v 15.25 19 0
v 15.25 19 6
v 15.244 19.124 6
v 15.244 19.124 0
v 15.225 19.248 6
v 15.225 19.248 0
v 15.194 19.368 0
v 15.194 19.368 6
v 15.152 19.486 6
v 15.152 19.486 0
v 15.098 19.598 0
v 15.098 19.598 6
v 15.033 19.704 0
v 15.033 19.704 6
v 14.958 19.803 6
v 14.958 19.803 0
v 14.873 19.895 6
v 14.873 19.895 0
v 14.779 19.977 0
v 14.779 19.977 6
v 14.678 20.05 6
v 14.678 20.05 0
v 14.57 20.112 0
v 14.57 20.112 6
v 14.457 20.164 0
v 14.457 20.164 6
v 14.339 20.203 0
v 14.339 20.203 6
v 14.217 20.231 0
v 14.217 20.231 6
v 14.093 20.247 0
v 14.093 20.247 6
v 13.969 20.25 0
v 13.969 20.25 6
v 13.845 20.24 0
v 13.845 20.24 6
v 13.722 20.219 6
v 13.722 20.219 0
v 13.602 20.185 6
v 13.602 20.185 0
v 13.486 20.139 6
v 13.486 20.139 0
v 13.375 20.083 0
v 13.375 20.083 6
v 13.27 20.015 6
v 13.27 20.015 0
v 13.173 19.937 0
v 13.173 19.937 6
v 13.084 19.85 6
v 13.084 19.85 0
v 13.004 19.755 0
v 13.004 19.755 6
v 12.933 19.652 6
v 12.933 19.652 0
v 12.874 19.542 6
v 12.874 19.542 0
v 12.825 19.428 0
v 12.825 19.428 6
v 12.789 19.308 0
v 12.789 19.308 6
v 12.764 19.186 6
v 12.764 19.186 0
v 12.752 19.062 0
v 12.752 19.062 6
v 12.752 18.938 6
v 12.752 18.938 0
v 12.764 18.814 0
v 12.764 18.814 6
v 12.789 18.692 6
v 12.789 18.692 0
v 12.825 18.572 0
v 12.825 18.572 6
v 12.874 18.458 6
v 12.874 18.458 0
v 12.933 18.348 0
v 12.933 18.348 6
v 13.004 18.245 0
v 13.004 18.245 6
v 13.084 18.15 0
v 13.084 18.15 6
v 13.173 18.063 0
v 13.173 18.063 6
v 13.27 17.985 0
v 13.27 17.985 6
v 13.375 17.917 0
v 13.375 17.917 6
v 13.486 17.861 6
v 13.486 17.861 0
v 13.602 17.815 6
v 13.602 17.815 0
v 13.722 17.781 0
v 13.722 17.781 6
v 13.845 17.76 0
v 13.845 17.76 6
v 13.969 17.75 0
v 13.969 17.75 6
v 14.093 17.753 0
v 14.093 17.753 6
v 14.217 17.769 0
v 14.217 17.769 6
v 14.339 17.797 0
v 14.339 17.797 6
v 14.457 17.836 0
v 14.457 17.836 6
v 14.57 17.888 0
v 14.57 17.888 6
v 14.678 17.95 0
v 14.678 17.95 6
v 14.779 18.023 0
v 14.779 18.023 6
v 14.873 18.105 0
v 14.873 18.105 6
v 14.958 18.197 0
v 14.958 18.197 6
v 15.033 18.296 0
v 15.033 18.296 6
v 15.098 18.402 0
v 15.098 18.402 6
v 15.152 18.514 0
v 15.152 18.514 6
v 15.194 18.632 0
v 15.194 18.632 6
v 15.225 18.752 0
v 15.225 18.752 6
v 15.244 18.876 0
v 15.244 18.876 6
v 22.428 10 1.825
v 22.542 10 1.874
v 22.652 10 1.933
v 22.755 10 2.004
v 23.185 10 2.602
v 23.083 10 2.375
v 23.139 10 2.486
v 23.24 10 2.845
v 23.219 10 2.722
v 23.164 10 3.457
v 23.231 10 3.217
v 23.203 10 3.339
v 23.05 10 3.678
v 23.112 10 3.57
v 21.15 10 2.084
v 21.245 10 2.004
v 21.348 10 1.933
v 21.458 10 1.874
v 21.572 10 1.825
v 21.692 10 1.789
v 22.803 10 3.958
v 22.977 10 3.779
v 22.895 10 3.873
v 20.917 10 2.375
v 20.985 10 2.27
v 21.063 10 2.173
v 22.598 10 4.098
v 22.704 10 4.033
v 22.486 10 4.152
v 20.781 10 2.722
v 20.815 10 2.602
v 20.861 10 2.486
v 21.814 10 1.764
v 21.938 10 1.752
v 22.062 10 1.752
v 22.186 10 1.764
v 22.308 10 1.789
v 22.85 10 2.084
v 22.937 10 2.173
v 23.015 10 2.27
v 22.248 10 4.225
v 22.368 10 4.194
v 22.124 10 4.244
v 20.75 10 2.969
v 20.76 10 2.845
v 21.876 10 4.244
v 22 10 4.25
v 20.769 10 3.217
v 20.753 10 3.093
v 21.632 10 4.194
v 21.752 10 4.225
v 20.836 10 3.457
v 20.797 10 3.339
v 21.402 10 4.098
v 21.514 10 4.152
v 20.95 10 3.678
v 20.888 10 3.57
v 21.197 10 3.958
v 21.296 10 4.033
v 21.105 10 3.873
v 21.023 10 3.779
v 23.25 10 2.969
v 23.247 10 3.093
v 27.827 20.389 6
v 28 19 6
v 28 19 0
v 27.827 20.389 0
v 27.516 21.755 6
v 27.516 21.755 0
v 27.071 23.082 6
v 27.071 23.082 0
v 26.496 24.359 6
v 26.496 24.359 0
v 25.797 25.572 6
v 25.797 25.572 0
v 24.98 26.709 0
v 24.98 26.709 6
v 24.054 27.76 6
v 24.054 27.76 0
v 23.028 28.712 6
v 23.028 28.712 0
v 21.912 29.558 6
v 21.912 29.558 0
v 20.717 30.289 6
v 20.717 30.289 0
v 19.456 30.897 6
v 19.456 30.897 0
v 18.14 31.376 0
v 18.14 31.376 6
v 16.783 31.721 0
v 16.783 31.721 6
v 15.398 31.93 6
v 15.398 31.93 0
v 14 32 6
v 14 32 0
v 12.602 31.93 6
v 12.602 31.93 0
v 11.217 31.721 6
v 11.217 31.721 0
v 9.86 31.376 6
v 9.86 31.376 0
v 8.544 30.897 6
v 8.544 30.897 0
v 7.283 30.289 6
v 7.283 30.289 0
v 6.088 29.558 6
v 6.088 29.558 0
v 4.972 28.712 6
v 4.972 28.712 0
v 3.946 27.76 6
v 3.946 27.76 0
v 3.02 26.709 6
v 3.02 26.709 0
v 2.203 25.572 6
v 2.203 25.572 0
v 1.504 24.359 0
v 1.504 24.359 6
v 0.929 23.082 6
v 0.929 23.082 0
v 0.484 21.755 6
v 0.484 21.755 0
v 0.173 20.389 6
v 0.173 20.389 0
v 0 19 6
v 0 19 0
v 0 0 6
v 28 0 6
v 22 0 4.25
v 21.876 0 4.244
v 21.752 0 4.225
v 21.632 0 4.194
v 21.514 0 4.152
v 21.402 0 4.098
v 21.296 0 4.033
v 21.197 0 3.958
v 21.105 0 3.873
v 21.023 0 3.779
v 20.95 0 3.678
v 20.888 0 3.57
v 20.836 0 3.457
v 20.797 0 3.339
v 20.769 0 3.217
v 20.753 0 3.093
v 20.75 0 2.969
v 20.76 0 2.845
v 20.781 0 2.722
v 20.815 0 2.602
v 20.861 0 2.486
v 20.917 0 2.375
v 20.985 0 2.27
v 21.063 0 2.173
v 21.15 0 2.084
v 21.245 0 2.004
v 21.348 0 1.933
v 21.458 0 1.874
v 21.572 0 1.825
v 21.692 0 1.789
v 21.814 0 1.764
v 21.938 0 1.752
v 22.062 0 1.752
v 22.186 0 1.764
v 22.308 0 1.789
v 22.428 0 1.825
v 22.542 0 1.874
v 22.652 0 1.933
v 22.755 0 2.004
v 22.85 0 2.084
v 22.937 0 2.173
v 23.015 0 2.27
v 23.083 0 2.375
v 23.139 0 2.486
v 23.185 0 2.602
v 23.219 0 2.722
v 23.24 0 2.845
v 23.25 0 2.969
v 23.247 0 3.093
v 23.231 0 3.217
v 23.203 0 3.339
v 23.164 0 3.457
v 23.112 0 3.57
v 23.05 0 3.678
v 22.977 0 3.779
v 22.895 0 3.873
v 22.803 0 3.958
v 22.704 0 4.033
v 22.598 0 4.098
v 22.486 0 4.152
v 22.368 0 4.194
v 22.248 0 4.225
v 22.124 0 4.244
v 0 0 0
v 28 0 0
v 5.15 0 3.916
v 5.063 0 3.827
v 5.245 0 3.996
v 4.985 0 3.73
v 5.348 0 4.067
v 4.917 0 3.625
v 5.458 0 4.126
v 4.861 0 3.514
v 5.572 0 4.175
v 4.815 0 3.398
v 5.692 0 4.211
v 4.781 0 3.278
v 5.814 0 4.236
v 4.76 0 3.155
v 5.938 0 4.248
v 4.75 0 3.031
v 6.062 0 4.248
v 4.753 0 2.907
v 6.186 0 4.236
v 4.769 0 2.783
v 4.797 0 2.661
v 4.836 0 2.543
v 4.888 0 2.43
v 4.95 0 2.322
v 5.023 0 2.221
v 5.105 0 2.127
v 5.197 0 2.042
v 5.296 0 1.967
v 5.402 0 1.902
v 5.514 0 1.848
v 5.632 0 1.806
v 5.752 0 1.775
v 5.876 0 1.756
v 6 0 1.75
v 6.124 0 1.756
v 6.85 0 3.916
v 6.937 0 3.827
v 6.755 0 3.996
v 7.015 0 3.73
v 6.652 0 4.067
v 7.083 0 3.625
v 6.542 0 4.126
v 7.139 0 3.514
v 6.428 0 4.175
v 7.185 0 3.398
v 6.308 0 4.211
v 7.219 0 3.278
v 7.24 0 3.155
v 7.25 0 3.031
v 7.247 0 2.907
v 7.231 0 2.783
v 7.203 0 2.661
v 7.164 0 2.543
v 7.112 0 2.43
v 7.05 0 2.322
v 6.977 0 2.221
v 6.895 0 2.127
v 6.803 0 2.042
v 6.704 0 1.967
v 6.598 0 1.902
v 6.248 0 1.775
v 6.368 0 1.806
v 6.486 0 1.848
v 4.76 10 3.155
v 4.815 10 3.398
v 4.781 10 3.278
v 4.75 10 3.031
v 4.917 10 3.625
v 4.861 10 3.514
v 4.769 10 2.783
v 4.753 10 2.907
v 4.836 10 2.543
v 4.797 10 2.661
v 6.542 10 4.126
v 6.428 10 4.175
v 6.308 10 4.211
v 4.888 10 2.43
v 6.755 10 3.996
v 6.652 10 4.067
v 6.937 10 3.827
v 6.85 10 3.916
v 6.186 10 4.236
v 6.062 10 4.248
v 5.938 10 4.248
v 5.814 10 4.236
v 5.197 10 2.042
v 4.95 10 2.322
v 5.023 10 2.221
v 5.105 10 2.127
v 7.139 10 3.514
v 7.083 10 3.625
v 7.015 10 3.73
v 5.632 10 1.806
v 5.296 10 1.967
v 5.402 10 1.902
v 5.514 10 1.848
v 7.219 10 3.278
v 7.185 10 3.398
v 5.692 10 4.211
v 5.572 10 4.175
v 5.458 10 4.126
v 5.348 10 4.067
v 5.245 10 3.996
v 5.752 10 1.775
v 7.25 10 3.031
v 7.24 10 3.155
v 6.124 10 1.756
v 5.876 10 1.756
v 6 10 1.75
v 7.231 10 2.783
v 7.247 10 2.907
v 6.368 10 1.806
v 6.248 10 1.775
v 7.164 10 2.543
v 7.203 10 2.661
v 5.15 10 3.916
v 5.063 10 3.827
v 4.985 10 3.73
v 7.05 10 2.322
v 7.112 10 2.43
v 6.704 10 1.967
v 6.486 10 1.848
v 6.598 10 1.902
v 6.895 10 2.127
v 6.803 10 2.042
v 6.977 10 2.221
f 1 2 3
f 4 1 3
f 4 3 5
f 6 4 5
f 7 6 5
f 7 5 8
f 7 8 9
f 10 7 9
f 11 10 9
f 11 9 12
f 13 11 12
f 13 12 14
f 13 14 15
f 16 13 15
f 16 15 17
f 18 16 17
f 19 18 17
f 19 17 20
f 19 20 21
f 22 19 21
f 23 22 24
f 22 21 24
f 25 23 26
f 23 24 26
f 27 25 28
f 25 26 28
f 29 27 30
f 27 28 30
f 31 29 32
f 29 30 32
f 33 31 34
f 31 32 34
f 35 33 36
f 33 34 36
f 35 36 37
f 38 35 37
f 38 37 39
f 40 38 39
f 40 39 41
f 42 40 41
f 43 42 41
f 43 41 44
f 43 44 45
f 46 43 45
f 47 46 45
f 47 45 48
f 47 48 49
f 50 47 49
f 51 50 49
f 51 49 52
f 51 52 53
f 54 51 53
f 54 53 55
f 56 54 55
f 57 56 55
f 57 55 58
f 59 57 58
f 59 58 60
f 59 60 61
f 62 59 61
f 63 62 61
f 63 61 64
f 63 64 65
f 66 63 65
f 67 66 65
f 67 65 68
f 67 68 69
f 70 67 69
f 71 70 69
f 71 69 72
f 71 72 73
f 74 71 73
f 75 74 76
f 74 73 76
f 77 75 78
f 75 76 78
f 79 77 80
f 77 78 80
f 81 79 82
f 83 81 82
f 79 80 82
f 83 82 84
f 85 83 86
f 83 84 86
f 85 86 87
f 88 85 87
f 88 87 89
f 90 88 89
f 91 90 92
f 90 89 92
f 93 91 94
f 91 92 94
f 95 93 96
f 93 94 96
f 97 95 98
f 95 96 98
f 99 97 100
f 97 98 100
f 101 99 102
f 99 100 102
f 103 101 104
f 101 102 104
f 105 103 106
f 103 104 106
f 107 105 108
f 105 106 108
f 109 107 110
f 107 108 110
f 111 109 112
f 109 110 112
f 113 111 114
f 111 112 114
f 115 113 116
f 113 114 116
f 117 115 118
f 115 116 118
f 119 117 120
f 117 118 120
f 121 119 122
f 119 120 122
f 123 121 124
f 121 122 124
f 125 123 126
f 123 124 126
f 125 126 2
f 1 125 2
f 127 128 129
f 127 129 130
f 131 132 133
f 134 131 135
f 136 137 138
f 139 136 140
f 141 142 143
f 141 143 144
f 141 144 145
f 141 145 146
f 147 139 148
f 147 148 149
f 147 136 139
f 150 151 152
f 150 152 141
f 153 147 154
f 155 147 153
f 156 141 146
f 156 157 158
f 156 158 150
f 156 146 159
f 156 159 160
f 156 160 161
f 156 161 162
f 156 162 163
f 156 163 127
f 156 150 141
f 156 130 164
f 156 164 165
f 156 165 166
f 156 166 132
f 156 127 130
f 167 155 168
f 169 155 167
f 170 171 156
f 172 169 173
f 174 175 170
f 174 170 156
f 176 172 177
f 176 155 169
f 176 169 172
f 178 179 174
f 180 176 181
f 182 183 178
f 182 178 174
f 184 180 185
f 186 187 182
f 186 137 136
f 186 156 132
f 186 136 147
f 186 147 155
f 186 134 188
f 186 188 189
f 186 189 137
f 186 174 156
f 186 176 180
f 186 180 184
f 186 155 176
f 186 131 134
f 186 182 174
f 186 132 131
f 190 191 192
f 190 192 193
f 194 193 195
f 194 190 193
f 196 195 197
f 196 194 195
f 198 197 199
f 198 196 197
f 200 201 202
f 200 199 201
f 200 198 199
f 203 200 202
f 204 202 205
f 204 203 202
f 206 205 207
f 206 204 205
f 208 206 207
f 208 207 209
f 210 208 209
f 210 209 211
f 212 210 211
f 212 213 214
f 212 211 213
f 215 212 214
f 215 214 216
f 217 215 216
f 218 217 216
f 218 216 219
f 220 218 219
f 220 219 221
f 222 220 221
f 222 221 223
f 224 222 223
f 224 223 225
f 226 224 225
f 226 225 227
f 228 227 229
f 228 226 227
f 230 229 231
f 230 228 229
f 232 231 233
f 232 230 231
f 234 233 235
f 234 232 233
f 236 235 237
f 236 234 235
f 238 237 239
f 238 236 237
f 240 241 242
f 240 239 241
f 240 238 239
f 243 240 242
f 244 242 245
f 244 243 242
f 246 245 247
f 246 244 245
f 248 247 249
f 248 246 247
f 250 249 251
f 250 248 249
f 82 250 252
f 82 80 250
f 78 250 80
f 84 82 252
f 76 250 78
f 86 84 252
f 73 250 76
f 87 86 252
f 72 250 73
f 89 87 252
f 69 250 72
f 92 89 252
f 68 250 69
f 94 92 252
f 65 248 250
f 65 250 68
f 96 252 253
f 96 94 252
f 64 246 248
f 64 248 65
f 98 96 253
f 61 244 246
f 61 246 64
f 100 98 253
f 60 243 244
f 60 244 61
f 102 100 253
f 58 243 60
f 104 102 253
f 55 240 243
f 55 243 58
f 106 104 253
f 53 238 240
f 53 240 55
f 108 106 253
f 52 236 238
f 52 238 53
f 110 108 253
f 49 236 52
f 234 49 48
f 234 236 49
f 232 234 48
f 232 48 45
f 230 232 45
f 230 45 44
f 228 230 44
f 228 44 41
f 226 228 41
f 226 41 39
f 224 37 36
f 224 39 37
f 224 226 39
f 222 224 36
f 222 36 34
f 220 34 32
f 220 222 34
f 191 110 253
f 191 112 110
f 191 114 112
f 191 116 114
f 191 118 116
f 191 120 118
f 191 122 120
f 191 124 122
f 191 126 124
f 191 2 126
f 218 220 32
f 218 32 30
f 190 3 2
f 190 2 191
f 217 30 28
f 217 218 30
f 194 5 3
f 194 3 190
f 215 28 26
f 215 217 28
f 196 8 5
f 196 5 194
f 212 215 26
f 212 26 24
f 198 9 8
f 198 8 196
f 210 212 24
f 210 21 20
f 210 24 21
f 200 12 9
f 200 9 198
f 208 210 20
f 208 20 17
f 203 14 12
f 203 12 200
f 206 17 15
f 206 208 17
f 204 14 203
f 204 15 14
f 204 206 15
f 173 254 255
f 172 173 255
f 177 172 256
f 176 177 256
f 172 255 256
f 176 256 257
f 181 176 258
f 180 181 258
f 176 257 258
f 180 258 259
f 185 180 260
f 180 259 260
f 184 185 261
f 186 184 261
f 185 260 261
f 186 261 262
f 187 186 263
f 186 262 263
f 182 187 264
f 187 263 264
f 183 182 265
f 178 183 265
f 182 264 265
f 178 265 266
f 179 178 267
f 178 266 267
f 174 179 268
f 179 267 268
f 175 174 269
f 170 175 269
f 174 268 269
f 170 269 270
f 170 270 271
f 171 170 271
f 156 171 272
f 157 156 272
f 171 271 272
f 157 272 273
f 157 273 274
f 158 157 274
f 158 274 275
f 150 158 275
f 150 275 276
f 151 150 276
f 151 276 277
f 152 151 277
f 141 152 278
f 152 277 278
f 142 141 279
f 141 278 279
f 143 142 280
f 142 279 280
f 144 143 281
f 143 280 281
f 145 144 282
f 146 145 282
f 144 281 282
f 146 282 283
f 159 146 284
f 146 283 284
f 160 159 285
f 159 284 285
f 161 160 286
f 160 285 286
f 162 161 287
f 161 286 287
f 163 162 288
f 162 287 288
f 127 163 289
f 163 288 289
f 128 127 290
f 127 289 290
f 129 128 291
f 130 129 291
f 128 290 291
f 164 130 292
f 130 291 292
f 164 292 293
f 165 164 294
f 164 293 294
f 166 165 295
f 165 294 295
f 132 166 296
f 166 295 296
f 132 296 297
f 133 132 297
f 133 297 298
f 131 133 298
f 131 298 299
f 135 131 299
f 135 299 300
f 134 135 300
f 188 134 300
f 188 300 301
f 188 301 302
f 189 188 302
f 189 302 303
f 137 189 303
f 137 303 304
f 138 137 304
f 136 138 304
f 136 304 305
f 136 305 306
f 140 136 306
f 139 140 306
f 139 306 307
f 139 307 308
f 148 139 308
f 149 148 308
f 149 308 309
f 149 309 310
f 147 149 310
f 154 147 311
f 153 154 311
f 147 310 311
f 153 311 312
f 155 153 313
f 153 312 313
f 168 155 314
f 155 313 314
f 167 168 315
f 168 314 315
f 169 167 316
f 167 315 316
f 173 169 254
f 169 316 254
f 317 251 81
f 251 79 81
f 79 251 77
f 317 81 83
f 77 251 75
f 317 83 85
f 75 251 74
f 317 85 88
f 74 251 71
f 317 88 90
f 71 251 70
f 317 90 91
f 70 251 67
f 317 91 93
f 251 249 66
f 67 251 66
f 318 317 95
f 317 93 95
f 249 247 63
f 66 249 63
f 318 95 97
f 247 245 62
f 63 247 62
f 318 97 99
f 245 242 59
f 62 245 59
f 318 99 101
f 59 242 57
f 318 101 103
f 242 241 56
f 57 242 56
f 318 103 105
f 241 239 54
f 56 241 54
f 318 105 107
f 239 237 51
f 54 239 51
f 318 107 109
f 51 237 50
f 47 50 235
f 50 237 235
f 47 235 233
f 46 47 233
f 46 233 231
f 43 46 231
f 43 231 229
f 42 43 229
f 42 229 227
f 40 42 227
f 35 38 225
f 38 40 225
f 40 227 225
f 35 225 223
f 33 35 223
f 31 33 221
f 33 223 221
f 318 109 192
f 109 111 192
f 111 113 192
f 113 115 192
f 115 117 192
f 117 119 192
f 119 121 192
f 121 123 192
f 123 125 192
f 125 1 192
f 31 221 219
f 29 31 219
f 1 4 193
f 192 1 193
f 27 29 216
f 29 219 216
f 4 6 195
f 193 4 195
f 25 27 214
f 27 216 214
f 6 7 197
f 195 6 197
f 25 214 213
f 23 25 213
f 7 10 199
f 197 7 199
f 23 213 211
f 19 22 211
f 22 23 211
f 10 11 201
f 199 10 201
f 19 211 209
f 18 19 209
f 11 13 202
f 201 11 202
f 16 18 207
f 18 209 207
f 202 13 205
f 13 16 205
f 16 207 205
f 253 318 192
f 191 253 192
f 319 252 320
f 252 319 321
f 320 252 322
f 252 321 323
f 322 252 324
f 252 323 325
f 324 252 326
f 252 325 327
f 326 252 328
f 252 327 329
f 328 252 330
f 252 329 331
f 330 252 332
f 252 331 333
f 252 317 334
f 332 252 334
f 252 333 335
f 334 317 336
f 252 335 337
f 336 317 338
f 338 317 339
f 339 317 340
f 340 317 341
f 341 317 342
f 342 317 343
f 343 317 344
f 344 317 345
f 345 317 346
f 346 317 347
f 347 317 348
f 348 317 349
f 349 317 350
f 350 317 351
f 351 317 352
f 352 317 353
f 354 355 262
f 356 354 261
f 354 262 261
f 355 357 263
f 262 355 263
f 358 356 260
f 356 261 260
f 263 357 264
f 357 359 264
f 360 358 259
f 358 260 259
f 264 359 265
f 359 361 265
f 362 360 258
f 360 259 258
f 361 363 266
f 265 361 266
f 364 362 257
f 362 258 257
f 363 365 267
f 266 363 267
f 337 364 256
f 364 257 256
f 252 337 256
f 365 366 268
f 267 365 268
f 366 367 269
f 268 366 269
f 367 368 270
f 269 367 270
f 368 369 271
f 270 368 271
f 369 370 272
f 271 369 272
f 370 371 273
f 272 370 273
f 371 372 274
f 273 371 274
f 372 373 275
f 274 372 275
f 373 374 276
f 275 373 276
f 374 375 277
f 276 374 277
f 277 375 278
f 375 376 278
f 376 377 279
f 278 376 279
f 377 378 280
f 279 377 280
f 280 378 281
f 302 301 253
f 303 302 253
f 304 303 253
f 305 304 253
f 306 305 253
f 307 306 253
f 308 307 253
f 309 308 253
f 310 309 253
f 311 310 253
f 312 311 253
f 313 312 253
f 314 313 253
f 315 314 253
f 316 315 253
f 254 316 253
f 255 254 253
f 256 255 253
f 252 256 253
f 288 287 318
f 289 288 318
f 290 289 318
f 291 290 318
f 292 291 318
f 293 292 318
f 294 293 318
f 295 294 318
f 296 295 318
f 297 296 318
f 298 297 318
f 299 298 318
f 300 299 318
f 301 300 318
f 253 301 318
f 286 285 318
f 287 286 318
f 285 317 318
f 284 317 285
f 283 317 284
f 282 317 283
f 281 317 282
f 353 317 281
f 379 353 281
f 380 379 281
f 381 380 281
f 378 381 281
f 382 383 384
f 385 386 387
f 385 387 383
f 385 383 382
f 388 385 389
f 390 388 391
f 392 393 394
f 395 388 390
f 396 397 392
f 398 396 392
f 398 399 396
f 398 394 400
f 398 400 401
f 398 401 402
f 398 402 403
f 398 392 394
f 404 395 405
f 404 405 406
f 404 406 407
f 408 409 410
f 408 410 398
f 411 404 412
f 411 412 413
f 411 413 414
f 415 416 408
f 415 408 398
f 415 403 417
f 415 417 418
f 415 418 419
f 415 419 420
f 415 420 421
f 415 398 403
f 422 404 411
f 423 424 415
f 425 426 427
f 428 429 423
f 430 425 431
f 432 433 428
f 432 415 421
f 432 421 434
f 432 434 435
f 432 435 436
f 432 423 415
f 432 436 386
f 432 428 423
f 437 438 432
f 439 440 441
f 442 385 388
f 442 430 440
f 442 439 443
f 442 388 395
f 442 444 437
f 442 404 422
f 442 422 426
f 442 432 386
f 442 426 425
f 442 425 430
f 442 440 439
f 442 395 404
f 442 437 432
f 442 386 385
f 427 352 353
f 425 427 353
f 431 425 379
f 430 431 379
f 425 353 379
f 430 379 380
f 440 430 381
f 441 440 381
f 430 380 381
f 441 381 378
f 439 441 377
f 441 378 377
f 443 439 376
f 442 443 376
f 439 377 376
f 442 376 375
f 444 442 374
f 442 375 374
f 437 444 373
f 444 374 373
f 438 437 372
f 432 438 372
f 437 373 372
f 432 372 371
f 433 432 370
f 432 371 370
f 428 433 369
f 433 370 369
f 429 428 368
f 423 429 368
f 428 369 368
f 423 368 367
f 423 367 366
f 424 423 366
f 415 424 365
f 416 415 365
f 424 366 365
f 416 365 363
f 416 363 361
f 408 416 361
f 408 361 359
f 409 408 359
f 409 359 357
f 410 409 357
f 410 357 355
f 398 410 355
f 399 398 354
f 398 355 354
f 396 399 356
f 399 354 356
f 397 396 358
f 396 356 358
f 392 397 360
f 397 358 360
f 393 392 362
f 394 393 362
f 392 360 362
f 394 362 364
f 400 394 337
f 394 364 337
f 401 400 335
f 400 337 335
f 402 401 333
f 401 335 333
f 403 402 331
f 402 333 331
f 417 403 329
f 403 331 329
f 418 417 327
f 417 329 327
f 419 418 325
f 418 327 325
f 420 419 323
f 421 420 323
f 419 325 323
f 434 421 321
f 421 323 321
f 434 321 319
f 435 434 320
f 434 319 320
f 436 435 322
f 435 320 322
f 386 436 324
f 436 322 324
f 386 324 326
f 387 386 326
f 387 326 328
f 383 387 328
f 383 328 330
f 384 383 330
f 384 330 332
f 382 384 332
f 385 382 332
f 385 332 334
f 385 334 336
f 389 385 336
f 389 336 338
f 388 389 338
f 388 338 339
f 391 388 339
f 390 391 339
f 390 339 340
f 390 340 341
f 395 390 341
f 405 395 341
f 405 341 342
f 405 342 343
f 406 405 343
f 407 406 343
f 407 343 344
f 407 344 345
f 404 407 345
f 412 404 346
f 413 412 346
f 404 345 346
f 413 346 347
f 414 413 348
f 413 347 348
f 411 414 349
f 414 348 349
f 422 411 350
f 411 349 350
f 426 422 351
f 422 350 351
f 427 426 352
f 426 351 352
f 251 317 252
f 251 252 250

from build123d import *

# Parameters (mm, degrees)
ESQUISSE1_W             = 28
ESQUISSE1_H             = 32
BOSS_EXTRU_1_DEPTH      = 6
ESQUISSE2_R             = 1.25
ENL_V_MAT_EXTRU_1_DEPTH = 10
ESQUISSE3_R             = 1.25
ENL_V_MAT_EXTRU_2_DEPTH = 43.941821107
ENL_V_MAT_EXTRU_3_DEPTH = 43.941821107


with BuildPart() as part:
    # Esquisse1 → Boss.-Extru.1 (new body)
    with BuildSketch(Plane.XY):
        with Locations((14, 16)):
            Rectangle(ESQUISSE1_W, ESQUISSE1_H)
    extrude(amount=BOSS_EXTRU_1_DEPTH)

    # Esquisse2 → Enlèv. mat.-Extru.1 (cut)
    with BuildSketch(Plane.XZ):
        with Locations(Location((6, 3, 0), (0, 0, 270))):
            Circle(ESQUISSE2_R)
        with Locations(Location((22, 3, 0), (0, 0, 90))):
            Circle(ESQUISSE2_R)
    extrude(amount=-ENL_V_MAT_EXTRU_1_DEPTH, mode=Mode.SUBTRACT)

    # Esquisse3 → Enlèv. mat.-Extru.2 (cut, through all)
    with BuildSketch(Plane.XY.offset(6)):
        with Locations((14, 19)):
            Circle(ESQUISSE3_R)
    extrude(amount=-ENL_V_MAT_EXTRU_2_DEPTH, mode=Mode.SUBTRACT)

    # Esquisse5 → Enlèv. mat.-Extru.3 (cut, through all)
    with BuildSketch(Plane.XY.offset(6)):
        with BuildLine():
            Line((0, 19), (0, 33))
            Line((0, 33), (28, 33))
            Line((28, 33), (28, 19))
            ThreePointArc((28, 19), (14, 32), (0, 19))
        make_face()
    extrude(amount=-ENL_V_MAT_EXTRU_3_DEPTH, mode=Mode.SUBTRACT)


solid = part.part
